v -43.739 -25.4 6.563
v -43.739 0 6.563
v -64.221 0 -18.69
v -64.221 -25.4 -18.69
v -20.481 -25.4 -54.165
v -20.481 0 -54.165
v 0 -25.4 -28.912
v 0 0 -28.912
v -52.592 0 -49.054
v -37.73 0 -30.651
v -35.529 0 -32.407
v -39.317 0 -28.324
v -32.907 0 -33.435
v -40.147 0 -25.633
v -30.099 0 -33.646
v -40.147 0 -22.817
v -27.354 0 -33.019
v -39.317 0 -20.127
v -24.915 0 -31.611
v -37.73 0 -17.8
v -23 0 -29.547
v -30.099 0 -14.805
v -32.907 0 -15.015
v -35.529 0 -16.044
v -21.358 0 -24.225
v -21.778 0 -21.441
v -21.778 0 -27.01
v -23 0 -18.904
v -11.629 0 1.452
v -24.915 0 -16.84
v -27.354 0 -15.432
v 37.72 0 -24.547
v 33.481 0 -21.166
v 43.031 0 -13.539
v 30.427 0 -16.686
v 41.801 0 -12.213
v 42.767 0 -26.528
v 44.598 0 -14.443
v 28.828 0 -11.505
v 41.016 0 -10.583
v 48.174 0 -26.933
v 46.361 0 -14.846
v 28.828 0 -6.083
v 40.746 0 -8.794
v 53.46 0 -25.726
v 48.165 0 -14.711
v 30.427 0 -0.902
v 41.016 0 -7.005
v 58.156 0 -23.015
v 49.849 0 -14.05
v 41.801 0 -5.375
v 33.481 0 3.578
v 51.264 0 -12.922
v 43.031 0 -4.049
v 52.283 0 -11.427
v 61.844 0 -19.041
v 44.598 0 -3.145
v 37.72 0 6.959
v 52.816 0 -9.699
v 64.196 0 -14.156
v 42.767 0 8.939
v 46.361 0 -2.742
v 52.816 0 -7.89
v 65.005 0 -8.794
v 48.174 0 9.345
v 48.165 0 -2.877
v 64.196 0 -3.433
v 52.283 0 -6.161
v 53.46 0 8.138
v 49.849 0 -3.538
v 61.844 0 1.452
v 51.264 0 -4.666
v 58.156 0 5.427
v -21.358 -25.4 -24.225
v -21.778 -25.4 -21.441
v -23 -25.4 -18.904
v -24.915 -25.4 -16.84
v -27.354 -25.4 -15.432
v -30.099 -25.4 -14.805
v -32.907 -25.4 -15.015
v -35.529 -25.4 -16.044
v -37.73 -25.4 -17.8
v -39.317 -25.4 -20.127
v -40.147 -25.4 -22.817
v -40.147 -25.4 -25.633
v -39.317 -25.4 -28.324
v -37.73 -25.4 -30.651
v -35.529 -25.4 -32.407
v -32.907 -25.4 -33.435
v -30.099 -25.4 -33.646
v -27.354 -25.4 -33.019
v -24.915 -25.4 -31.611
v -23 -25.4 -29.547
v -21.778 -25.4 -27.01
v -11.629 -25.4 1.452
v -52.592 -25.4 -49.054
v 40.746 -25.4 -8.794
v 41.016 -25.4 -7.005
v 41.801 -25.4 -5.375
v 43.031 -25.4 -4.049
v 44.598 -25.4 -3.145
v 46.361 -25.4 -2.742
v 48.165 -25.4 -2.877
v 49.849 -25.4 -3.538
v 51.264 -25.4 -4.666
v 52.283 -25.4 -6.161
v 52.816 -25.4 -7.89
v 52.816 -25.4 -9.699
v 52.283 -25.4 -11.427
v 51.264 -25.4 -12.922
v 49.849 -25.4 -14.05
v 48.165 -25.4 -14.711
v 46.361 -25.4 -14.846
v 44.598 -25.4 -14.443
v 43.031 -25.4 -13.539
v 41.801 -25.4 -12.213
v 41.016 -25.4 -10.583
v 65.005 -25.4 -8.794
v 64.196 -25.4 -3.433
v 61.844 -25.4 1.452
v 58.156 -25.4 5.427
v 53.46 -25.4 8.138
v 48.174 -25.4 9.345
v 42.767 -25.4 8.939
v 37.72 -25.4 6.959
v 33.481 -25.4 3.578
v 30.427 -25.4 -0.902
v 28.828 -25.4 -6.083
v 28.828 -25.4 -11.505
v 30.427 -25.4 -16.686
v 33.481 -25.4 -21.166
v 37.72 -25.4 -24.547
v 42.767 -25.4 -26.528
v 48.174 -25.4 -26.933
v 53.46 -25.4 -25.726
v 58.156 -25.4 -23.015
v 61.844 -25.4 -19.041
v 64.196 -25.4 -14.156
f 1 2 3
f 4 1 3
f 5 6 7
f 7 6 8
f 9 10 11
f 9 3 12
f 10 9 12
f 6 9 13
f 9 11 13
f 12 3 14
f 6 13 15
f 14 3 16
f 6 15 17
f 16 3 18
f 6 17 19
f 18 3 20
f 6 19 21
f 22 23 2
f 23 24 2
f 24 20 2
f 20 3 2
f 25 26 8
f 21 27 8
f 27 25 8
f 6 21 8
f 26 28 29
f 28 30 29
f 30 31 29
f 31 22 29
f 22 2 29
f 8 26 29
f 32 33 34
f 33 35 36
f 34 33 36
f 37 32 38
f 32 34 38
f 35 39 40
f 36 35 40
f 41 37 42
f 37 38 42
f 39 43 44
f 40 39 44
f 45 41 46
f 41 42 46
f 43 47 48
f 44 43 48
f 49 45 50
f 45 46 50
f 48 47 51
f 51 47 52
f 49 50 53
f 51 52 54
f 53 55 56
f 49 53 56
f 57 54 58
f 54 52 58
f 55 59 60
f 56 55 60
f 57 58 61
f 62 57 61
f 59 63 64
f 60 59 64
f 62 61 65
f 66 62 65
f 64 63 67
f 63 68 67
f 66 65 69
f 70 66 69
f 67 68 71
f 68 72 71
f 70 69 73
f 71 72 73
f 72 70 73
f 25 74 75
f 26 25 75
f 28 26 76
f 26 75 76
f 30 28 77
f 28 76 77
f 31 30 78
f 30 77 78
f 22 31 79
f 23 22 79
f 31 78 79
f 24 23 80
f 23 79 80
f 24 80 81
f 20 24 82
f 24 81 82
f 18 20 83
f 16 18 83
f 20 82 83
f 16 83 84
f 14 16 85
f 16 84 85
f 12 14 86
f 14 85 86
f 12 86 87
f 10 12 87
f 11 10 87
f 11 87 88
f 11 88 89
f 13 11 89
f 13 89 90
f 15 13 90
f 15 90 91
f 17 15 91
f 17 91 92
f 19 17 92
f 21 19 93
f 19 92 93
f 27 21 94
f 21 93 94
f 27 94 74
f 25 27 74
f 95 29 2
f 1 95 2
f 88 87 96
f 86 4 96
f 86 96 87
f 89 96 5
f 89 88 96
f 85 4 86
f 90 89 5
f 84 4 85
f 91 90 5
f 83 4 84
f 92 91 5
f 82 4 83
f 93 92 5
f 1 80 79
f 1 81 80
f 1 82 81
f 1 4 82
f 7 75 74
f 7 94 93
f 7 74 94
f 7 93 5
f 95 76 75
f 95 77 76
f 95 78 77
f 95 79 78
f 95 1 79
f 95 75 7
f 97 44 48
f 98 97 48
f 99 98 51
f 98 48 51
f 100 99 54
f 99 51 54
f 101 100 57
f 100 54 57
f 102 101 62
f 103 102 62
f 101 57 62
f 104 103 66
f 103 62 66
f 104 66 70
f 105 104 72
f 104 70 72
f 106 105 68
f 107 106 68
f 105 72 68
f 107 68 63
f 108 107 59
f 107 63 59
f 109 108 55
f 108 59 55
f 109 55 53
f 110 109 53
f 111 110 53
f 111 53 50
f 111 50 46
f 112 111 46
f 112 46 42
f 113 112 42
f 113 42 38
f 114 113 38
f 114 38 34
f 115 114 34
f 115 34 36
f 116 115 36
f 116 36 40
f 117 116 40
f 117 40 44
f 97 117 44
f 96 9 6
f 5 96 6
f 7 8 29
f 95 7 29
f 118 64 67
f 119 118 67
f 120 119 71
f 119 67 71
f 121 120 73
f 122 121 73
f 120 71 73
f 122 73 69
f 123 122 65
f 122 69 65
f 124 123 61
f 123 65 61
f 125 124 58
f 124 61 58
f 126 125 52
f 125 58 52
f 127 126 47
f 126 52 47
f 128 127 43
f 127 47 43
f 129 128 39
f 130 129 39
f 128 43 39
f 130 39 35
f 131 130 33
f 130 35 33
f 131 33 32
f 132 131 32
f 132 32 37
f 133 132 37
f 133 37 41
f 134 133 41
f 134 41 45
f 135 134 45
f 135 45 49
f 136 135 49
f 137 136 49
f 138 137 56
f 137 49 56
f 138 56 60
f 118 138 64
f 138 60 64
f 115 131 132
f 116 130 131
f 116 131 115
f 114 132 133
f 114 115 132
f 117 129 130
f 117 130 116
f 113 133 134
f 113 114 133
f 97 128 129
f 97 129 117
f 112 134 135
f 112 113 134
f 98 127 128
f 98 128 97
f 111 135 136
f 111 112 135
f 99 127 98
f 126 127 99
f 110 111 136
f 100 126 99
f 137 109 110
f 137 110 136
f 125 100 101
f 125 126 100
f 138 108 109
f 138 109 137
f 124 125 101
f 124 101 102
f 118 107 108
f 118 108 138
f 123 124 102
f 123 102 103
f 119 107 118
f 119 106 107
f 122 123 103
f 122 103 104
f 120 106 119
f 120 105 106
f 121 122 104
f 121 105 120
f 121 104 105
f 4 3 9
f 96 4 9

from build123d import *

# Parameters (mm, degrees)
F1_R      = 18.1896249191
F5_DEPTH  = 25.4
F6_R      = 6.0688570955
F7_DEPTH  = 27.2348383442
F9_DEPTH  = 25.4
F10_R     = 9.4468290058
F11_DEPTH = 25.4


# Not quite as in the source:
# - a feature of the source that left no trace in its solid (it failed there, or was rolled back) is left out


with BuildPart() as f5:
    # F1 (on Front) → F5 (new body)
    with BuildSketch(Plane.XZ):
        with Locations((46.8149334192, -8.7941288948)):
            Circle(F1_R)
    extrude(amount=F5_DEPTH)

    # F6 (on face) → F7 (cut)
    with BuildSketch(Plane(origin=(0, 0, 0), x_dir=(-1, 0, 0), z_dir=(0, 1, 0))):
        with Locations((-46.8149334192, -8.7941288948)):
            Circle(F6_R)
    extrude(amount=-F7_DEPTH, mode=Mode.SUBTRACT)


with BuildPart() as f9:
    # F8 (on Front) → F9 (new body)
    with BuildSketch(Plane.XZ):
        Polygon((-20.4813697214, -54.164792812), (0, -28.9118289948), (-11.6290233259, 1.4520393969), (-43.7394163733, 6.5629439713), (-64.2207860947, -18.690019846), (-52.5917627687, -49.0538882377), align=None)
    extrude(amount=F9_DEPTH)

    # F10 (on face) → F11 (cut)
    with BuildSketch(Plane.XZ.offset(25.4)):
        with Locations((-30.8052618057, -24.2253299803)):
            Circle(F10_R)
    extrude(amount=-F11_DEPTH, mode=Mode.SUBTRACT)


solid = Compound([f5.part, f9.part])
